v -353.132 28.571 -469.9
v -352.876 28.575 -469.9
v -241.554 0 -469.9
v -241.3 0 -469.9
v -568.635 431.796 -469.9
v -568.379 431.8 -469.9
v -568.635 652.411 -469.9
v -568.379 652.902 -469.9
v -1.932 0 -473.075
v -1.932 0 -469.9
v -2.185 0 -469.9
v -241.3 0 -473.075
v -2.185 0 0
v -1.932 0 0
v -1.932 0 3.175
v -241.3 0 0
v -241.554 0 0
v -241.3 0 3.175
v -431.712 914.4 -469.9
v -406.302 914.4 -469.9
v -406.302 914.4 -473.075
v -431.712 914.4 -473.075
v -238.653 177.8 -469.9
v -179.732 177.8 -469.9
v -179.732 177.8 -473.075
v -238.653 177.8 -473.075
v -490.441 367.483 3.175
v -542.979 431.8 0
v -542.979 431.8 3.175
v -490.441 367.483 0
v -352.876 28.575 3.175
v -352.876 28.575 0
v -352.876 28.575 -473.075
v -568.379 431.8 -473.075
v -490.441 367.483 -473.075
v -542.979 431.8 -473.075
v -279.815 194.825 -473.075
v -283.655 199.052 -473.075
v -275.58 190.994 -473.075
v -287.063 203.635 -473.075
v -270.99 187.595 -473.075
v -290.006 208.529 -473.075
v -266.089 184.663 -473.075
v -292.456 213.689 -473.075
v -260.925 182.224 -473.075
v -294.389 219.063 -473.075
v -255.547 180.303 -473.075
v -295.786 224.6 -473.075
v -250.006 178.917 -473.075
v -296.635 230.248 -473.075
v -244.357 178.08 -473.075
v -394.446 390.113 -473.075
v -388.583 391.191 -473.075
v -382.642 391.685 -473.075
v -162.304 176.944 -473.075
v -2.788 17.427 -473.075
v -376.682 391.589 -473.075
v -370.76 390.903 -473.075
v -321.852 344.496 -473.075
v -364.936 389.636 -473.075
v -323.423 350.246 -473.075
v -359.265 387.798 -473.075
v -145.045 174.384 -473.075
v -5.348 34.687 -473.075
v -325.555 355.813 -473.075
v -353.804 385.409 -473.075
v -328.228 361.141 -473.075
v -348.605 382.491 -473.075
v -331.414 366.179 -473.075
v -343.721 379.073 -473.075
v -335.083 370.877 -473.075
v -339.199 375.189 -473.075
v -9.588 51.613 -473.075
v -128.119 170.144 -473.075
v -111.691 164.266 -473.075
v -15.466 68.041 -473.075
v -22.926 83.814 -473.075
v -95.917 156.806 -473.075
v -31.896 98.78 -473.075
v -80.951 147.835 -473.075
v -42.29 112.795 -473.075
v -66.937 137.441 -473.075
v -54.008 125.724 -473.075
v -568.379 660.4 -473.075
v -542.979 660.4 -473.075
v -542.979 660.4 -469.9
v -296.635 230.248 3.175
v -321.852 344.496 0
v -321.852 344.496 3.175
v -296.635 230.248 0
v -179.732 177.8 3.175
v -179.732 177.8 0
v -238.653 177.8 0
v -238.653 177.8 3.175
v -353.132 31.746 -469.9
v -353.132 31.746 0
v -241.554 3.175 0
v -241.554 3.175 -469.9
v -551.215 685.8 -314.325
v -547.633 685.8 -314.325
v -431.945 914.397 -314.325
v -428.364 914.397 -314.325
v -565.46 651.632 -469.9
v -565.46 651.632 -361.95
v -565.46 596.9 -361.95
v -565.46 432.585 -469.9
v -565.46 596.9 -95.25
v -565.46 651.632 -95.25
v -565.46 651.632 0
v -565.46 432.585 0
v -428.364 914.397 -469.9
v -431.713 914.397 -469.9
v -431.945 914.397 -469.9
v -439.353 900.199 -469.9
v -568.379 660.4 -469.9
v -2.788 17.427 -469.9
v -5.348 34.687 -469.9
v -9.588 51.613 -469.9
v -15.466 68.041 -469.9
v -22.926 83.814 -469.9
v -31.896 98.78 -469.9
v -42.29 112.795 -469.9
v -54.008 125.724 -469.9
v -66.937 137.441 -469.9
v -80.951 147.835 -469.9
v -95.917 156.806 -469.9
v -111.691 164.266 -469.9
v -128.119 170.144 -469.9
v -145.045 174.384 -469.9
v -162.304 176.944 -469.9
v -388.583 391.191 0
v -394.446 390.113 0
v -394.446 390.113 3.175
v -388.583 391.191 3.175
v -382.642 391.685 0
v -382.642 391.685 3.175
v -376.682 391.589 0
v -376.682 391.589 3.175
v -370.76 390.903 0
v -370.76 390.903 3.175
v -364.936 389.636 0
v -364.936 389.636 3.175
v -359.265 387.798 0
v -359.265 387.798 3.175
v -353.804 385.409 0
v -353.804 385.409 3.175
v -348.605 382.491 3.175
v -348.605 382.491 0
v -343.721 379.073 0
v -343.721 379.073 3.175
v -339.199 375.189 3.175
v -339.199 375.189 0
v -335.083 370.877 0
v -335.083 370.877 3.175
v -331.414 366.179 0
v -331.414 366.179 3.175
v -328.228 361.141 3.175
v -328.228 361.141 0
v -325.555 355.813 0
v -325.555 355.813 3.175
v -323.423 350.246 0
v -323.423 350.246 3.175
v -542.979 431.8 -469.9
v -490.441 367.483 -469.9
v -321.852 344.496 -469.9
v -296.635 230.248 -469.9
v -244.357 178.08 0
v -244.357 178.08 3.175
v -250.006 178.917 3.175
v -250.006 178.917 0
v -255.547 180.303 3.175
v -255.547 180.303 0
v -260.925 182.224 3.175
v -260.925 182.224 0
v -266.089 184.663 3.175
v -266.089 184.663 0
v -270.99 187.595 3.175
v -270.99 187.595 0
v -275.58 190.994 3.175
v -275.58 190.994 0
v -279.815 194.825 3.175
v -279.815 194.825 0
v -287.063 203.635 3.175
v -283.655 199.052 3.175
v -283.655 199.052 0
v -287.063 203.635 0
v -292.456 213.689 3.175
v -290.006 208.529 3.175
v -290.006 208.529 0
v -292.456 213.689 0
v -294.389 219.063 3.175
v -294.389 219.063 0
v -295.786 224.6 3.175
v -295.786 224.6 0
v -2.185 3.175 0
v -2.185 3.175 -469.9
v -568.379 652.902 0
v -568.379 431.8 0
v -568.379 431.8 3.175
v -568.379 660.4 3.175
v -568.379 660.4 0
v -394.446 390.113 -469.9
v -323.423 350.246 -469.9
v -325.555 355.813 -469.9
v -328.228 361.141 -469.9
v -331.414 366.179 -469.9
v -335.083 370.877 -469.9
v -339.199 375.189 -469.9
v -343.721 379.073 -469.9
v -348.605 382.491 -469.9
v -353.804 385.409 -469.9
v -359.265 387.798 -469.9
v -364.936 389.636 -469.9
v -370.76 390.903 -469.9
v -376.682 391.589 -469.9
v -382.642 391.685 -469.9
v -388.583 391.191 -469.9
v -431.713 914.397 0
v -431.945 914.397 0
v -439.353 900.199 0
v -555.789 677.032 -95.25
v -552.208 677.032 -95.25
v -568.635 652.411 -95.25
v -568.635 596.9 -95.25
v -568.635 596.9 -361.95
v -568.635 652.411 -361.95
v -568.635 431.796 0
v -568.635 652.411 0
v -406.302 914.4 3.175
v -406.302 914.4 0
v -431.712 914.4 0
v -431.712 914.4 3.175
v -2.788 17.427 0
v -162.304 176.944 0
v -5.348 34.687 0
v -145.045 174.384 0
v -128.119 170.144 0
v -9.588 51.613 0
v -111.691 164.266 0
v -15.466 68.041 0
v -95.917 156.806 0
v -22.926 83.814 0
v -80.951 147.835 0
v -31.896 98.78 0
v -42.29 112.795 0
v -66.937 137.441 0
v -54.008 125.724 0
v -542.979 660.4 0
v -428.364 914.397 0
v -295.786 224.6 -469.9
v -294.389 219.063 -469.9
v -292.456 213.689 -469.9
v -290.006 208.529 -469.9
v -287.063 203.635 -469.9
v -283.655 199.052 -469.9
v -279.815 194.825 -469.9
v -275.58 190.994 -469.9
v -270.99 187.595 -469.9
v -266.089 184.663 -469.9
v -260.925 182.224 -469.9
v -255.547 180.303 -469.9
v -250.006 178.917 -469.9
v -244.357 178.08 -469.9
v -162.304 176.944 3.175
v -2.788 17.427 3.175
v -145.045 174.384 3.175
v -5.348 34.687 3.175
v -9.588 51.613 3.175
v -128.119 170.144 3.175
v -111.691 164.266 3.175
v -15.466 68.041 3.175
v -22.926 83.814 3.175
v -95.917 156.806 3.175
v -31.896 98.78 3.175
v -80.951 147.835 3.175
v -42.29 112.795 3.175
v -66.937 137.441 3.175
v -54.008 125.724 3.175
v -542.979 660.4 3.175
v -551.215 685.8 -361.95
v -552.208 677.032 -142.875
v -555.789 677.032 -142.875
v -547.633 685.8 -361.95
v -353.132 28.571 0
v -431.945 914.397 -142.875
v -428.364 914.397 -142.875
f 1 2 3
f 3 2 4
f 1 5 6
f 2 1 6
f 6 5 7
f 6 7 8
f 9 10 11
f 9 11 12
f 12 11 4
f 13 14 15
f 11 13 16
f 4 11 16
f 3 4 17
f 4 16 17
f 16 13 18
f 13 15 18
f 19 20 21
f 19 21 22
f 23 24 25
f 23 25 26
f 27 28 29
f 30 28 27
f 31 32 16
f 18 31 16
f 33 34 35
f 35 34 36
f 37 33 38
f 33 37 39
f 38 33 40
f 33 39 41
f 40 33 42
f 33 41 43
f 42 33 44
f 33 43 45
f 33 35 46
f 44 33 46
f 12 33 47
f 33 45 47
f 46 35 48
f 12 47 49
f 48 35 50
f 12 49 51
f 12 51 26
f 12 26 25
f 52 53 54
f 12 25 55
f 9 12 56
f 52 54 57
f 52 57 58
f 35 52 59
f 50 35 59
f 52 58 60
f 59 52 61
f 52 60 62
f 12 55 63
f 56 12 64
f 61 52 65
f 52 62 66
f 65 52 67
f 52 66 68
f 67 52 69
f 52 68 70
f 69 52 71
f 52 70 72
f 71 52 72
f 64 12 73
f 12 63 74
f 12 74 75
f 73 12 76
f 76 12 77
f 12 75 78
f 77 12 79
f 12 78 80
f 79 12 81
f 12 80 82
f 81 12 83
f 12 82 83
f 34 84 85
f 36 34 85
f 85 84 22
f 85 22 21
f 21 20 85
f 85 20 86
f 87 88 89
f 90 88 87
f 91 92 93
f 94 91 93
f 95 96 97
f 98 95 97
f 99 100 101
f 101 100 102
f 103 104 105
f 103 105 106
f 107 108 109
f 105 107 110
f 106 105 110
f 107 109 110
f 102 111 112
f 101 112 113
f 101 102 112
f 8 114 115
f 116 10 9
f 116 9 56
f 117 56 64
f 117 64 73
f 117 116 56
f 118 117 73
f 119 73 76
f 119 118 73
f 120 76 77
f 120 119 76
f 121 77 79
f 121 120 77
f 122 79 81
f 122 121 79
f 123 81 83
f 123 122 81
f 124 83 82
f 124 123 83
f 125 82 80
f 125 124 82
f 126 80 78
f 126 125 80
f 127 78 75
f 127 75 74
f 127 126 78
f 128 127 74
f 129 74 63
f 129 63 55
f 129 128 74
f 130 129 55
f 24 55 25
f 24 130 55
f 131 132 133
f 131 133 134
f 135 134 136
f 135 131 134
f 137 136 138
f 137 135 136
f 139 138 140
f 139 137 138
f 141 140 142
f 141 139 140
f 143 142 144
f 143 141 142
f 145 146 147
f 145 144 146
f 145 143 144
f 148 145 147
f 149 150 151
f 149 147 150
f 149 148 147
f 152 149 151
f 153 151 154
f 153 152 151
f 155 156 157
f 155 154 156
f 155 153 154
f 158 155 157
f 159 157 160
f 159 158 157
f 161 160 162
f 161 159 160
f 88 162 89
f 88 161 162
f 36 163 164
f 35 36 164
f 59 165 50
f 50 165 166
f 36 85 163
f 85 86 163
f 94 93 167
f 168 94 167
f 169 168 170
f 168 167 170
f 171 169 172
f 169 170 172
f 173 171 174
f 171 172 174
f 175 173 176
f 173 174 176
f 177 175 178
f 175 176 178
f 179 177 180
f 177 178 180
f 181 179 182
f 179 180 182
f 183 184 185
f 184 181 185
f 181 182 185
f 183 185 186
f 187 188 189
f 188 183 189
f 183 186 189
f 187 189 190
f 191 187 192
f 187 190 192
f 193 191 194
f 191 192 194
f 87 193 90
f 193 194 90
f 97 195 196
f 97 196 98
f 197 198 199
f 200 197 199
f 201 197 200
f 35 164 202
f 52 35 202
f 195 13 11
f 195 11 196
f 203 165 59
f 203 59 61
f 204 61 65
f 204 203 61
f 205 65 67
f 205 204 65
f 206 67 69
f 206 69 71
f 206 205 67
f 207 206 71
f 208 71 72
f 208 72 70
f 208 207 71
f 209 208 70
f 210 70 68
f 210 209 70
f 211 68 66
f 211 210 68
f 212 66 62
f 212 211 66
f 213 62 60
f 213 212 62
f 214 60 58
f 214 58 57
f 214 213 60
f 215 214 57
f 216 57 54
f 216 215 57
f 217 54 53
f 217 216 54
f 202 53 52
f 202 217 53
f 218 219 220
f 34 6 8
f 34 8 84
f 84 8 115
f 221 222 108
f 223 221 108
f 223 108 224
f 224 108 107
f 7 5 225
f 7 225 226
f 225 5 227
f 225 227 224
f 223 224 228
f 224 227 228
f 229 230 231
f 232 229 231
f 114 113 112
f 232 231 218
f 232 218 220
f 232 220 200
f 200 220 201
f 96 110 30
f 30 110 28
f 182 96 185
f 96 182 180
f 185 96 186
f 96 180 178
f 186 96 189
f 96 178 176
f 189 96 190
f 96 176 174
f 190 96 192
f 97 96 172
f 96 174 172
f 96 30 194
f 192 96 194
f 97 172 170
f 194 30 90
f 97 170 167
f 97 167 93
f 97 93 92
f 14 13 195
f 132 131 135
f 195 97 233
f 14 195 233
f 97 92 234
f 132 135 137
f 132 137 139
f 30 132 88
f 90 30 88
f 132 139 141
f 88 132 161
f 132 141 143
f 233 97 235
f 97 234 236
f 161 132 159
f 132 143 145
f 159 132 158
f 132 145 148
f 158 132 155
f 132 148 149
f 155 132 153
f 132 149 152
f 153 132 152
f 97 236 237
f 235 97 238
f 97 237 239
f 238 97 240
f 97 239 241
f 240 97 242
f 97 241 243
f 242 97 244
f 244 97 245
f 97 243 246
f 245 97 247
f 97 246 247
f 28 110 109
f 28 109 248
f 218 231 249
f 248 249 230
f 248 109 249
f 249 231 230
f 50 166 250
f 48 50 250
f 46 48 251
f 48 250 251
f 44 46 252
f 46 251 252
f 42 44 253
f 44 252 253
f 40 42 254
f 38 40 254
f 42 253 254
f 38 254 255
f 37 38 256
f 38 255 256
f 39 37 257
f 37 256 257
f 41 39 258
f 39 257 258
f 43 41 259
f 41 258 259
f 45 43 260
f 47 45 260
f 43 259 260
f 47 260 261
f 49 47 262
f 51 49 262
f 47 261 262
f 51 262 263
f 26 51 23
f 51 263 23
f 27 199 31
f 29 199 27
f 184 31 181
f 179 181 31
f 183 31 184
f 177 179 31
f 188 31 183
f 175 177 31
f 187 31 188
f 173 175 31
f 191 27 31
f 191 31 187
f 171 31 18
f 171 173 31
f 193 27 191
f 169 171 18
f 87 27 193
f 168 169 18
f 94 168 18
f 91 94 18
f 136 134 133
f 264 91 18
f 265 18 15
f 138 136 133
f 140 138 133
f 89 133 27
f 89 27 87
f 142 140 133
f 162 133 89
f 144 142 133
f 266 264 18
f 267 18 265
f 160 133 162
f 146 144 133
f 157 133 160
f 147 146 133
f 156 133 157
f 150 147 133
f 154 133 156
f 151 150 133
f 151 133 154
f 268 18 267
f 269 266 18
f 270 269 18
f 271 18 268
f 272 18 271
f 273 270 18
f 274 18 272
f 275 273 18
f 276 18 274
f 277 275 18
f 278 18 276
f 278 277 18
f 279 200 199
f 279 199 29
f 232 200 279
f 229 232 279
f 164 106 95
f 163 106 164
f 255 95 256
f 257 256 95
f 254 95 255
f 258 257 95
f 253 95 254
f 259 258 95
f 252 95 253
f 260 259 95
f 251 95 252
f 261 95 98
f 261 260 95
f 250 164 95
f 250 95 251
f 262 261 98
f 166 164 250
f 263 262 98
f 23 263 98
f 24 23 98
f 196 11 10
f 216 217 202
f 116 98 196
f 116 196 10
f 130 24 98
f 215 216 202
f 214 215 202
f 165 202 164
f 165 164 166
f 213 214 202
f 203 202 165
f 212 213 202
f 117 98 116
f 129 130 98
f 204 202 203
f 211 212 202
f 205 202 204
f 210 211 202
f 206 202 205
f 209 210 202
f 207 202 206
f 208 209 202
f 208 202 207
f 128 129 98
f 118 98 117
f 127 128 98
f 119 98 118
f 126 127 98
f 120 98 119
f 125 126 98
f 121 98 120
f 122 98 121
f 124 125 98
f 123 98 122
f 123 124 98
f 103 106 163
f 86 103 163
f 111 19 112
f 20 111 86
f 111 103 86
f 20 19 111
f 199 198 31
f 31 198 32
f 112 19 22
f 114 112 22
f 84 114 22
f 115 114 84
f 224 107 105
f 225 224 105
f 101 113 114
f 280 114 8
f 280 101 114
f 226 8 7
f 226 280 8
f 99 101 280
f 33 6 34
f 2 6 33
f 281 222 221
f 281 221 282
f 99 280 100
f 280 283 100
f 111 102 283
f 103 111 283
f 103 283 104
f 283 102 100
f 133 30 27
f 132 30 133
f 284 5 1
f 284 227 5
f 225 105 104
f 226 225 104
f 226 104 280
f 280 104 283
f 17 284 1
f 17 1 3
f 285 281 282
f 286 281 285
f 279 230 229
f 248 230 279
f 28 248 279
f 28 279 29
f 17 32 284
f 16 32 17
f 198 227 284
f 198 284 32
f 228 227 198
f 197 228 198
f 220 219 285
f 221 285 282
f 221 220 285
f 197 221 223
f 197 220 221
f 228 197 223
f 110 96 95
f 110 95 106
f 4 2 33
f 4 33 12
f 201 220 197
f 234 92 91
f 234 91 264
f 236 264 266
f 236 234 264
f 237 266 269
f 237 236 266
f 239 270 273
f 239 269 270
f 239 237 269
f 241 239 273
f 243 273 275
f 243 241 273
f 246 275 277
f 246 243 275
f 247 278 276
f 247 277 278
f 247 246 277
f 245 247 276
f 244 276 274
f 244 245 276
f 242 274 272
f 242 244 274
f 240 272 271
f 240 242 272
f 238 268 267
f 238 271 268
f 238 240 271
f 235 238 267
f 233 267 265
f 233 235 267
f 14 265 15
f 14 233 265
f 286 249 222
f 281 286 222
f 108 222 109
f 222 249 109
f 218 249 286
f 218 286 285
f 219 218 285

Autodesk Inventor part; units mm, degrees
ref_plane "YZ Plane" through (0, 0, 0) normal (1, 0, 0) x (0, 1, 0)
ref_plane "XZ Plane" through (0, 0, 0) normal (0, 1, 0) x (-1, 0, 0)
sketch "Sketch1" plane through (0, 0, 0) normal (0, 0, 1) x (1, 0, 0)
  line L0 (0, 0) -> (-241.3, 0)
  line L1 (-352.8762, 28.575) -> (-241.3, 0)
  line L2 (-568.379, 431.8) -> (-352.8762, 28.575)
  arc A0 (-1.9317, 0) -> (-179.7317, 177.8) centre (-179.7317, 0) ccw
  arc A1 (-321.8515, 344.496) -> (-394.4455, 390.1126) centre (-380.6333, 331.522) ccw
  line L3 (-179.7317, 177.8) -> (-238.6526, 177.8)
  line L4 (-321.8515, 344.496) -> (-296.6352, 230.2477)
  arc A2 (-296.6352, 230.2477) -> (-238.6526, 177.8) centre (-238.6526, 236.0747) ccw
  line L5 (-490.4406, 367.4826) -> (-394.4455, 390.1126)
  line L6 (-568.379, 431.8) -> (-568.379, 660.4)
  line L7 (-542.979, 660.4) -> (-542.979, 431.8)
  line L8 (-542.979, 431.8) -> (-490.4406, 367.4826)
  line L9 (-431.7117, 914.4) -> (-568.379, 660.4)
  line L10 (-406.3016, 914.4) -> (-542.979, 660.4)
  line L11 (-406.3016, 914.4) -> (-431.7117, 914.4)
sketch "Sketch4" plane through (0, 0, 0) normal (0, 0, 1) x (1, 0, 0)
  line L0 (-0.2535, 0) -> (-241.5535, 0)
  line L1 (-353.1324, 28.571) -> (-241.5535, 0)
  line L2 (-568.6352, 431.796) -> (-353.1324, 28.571)
  line L3 (-568.6352, 431.796) -> (-568.6352, 652.411)
  line L4 (-565.4602, 651.6325) -> (-565.4602, 432.585)
  line L5 (-431.9451, 914.3967) -> (-568.6352, 652.411)
  line L6 (-428.3639, 914.3967) -> (-565.4602, 651.6325)
  line L7 (-428.3639, 914.3967) -> (-431.9451, 914.3967)
  line L8 (-2.1852, 0) -> (-2.1852, 3.175)
  line L9 (-241.5535, 0) -> (-228.8535, 0)
  line L10 (-228.8535, 0) -> (-228.8535, 3.175)
  line L11 (-2.1852, 3.175) -> (-228.8535, 3.175)
  line L12 (-241.5535, 0) -> (-241.5535, 3.175)
  line L13 (-353.1324, 28.571) -> (-353.1324, 31.746)
  line L14 (-353.1324, 31.746) -> (-241.5535, 3.175)
  line L15 (-353.1324, 31.746) -> (-565.4602, 432.585)
  line L16 (-241.5535, 3.175) -> (-228.8535, 3.175)
  line L17 (-565.4602, 432.585) -> (-568.2578, 431.0898)
  line L18 (-565.4602, 651.6325) -> (-568.6352, 652.411)
  point P0 (0, 0)
  dimension "d63" = 3.175
  dimension "d64" = 12.7
  dimension "d65" = 3.175
  dimension "d66" = 3.175
  dimension "d68" = 3.175
  dimension "d90" = 3.175
  dimension "d92" = 3.175
  dimension "d93" = 3.175
  dimension "d96" = 0
  dimension "d97" = 0
extrude "Extrusion1" add sketch "Sketch4" against normal blind 469.9
extrude "Extrusion2" add sketch "Sketch1" along normal blind 3.175
ref_plane "Work Plane3" through (0, 0, -469.9) normal (0, 0, 1) x (1, 0, 0)
sketch "Sketch5" plane through (0, 0, 0) normal (0, 0, 1) x (1, 0, 0)
  line L0 (0, 0) -> (-241.3, 0)
  line L1 (-352.8762, 28.575) -> (-241.3, 0)
  line L2 (-568.379, 431.8) -> (-352.8762, 28.575)
  arc A0 (-1.9317, 0) -> (-179.7317, 177.8) centre (-179.7317, 0) ccw
  arc A1 (-321.8515, 344.496) -> (-394.4455, 390.1126) centre (-380.6333, 331.522) ccw
  line L3 (-179.7317, 177.8) -> (-238.6526, 177.8)
  line L4 (-321.8515, 344.496) -> (-296.6352, 230.2477)
  arc A2 (-296.6352, 230.2477) -> (-238.6526, 177.8) centre (-238.6526, 236.0747) ccw
  line L5 (-490.4406, 367.4826) -> (-394.4455, 390.1126)
  line L6 (-568.379, 431.8) -> (-568.379, 660.4)
  line L7 (-542.979, 660.4) -> (-542.979, 431.8)
  line L8 (-542.979, 431.8) -> (-490.4406, 367.4826)
  line L9 (-431.7117, 914.4) -> (-568.379, 660.4)
  line L10 (-406.3016, 914.4) -> (-542.979, 660.4)
  line L11 (-406.3016, 914.4) -> (-431.7117, 914.4)
sketch "Sketch6" plane through (0, 0, -469.9) normal (0, 0, 1) x (1, 0, 0)
  point P0 (0, 0)
sketch "Sketch7" plane through (0, 0, -469.9) normal (0, 0, 1) x (1, 0, 0)
  line L0 (0, 0) -> (-241.3, 0)
  line L1 (-352.8762, 28.575) -> (-241.3, 0)
  line L2 (-568.379, 431.8) -> (-352.8762, 28.575)
  arc A0 (-1.9317, 0) -> (-179.7317, 177.8) centre (-179.7317, 0) ccw
  arc A1 (-321.8515, 344.496) -> (-394.4455, 390.1126) centre (-380.6333, 331.522) ccw
  line L3 (-179.7317, 177.8) -> (-238.6526, 177.8)
  line L4 (-321.8515, 344.496) -> (-296.6352, 230.2477)
  arc A2 (-296.6352, 230.2477) -> (-238.6526, 177.8) centre (-238.6526, 236.0747) ccw
  line L5 (-490.4406, 367.4826) -> (-394.4455, 390.1126)
  line L6 (-568.379, 431.8) -> (-568.379, 660.4)
  line L7 (-542.979, 660.4) -> (-542.979, 431.8)
  line L8 (-542.979, 431.8) -> (-490.4406, 367.4826)
  line L9 (-431.7117, 914.4) -> (-568.379, 660.4)
  line L10 (-406.3016, 914.4) -> (-542.979, 660.4)
  line L11 (-406.3016, 914.4) -> (-431.7117, 914.4)
extrude "Extrusion3" add sketch "Sketch7" against normal blind 3.175
sketch "Sketch8" plane through (0, 0, 0) normal (1, 0, 0) x (0, 1, 0)
  line L0 (0, 0) -> (0, -228.6)
  line L1 (0, -473.075) -> (0, 3.175) projected
  line L2 (0, -228.6) -> (596.9, -228.6)
  line L3 (651.6325, -473.075) -> (651.6325, 3.175) projected
  line L4 (596.9, -228.6) -> (596.9, -95.25)
  line L5 (432.585, 0) -> (432.585, -469.9) projected
  line L6 (596.9, -228.6) -> (596.9, -361.95)
  line L7 (596.9, -361.95) -> (1104.9, -361.95)
  line L8 (1104.9, -361.95) -> (1104.9, -95.25)
  line L9 (1104.9, -95.25) -> (596.9, -95.25)
  line L10 (596.9, -95.25) -> (651.6325, -95.25)
  line L11 (651.6325, -95.25) -> (677.0325, -95.25)
  line L12 (677.0325, -95.25) -> (677.0325, -142.875)
  line L13 (677.0325, -142.875) -> (1104.9, -142.875)
  line L14 (651.6325, -361.95) -> (685.8, -361.95)
  line L15 (685.8, -361.95) -> (685.8, -314.325)
  line L16 (685.8, -314.325) -> (1104.9, -314.325)
  point P0 (660.4, -473.075)
  point P1 (660.4, 3.175)
  point P2 (431.8, 0)
  point P3 (431.8, -469.9)
  point P4 (432.585, -469.9)
  dimension "d77" = 228.6
  dimension "d78" = 596.9
  dimension "d80" = 133.35
  dimension "d81" = 133.35
  dimension "d82" = 508
  dimension "d83" = 266.7
  dimension "d84" = 25.4
  dimension "d85" = 47.625
  dimension "d86" = 47.625
extrude "Extrusion4" cut sketch "Sketch8" against normal blind 914.4 contours L7 L6 L4 L9 L3 | L3 L9 L12 L13 L8 L16 L15 L7
equation "\"SeatBottomDepth\" = 241.3"
equation "\"SeatFrontBottomWidth\" = 469.9"
equation "\"SeatFrontSidesWidth\" = 520.7"
equation "\"SeatBackInnerWidth\" = 304.8"
equation "\"SeatBackOuterWidth\" = 482.6"
equation "\"SeatBackLength\" = 457.2"
properties part number "Seat3DSketch"
